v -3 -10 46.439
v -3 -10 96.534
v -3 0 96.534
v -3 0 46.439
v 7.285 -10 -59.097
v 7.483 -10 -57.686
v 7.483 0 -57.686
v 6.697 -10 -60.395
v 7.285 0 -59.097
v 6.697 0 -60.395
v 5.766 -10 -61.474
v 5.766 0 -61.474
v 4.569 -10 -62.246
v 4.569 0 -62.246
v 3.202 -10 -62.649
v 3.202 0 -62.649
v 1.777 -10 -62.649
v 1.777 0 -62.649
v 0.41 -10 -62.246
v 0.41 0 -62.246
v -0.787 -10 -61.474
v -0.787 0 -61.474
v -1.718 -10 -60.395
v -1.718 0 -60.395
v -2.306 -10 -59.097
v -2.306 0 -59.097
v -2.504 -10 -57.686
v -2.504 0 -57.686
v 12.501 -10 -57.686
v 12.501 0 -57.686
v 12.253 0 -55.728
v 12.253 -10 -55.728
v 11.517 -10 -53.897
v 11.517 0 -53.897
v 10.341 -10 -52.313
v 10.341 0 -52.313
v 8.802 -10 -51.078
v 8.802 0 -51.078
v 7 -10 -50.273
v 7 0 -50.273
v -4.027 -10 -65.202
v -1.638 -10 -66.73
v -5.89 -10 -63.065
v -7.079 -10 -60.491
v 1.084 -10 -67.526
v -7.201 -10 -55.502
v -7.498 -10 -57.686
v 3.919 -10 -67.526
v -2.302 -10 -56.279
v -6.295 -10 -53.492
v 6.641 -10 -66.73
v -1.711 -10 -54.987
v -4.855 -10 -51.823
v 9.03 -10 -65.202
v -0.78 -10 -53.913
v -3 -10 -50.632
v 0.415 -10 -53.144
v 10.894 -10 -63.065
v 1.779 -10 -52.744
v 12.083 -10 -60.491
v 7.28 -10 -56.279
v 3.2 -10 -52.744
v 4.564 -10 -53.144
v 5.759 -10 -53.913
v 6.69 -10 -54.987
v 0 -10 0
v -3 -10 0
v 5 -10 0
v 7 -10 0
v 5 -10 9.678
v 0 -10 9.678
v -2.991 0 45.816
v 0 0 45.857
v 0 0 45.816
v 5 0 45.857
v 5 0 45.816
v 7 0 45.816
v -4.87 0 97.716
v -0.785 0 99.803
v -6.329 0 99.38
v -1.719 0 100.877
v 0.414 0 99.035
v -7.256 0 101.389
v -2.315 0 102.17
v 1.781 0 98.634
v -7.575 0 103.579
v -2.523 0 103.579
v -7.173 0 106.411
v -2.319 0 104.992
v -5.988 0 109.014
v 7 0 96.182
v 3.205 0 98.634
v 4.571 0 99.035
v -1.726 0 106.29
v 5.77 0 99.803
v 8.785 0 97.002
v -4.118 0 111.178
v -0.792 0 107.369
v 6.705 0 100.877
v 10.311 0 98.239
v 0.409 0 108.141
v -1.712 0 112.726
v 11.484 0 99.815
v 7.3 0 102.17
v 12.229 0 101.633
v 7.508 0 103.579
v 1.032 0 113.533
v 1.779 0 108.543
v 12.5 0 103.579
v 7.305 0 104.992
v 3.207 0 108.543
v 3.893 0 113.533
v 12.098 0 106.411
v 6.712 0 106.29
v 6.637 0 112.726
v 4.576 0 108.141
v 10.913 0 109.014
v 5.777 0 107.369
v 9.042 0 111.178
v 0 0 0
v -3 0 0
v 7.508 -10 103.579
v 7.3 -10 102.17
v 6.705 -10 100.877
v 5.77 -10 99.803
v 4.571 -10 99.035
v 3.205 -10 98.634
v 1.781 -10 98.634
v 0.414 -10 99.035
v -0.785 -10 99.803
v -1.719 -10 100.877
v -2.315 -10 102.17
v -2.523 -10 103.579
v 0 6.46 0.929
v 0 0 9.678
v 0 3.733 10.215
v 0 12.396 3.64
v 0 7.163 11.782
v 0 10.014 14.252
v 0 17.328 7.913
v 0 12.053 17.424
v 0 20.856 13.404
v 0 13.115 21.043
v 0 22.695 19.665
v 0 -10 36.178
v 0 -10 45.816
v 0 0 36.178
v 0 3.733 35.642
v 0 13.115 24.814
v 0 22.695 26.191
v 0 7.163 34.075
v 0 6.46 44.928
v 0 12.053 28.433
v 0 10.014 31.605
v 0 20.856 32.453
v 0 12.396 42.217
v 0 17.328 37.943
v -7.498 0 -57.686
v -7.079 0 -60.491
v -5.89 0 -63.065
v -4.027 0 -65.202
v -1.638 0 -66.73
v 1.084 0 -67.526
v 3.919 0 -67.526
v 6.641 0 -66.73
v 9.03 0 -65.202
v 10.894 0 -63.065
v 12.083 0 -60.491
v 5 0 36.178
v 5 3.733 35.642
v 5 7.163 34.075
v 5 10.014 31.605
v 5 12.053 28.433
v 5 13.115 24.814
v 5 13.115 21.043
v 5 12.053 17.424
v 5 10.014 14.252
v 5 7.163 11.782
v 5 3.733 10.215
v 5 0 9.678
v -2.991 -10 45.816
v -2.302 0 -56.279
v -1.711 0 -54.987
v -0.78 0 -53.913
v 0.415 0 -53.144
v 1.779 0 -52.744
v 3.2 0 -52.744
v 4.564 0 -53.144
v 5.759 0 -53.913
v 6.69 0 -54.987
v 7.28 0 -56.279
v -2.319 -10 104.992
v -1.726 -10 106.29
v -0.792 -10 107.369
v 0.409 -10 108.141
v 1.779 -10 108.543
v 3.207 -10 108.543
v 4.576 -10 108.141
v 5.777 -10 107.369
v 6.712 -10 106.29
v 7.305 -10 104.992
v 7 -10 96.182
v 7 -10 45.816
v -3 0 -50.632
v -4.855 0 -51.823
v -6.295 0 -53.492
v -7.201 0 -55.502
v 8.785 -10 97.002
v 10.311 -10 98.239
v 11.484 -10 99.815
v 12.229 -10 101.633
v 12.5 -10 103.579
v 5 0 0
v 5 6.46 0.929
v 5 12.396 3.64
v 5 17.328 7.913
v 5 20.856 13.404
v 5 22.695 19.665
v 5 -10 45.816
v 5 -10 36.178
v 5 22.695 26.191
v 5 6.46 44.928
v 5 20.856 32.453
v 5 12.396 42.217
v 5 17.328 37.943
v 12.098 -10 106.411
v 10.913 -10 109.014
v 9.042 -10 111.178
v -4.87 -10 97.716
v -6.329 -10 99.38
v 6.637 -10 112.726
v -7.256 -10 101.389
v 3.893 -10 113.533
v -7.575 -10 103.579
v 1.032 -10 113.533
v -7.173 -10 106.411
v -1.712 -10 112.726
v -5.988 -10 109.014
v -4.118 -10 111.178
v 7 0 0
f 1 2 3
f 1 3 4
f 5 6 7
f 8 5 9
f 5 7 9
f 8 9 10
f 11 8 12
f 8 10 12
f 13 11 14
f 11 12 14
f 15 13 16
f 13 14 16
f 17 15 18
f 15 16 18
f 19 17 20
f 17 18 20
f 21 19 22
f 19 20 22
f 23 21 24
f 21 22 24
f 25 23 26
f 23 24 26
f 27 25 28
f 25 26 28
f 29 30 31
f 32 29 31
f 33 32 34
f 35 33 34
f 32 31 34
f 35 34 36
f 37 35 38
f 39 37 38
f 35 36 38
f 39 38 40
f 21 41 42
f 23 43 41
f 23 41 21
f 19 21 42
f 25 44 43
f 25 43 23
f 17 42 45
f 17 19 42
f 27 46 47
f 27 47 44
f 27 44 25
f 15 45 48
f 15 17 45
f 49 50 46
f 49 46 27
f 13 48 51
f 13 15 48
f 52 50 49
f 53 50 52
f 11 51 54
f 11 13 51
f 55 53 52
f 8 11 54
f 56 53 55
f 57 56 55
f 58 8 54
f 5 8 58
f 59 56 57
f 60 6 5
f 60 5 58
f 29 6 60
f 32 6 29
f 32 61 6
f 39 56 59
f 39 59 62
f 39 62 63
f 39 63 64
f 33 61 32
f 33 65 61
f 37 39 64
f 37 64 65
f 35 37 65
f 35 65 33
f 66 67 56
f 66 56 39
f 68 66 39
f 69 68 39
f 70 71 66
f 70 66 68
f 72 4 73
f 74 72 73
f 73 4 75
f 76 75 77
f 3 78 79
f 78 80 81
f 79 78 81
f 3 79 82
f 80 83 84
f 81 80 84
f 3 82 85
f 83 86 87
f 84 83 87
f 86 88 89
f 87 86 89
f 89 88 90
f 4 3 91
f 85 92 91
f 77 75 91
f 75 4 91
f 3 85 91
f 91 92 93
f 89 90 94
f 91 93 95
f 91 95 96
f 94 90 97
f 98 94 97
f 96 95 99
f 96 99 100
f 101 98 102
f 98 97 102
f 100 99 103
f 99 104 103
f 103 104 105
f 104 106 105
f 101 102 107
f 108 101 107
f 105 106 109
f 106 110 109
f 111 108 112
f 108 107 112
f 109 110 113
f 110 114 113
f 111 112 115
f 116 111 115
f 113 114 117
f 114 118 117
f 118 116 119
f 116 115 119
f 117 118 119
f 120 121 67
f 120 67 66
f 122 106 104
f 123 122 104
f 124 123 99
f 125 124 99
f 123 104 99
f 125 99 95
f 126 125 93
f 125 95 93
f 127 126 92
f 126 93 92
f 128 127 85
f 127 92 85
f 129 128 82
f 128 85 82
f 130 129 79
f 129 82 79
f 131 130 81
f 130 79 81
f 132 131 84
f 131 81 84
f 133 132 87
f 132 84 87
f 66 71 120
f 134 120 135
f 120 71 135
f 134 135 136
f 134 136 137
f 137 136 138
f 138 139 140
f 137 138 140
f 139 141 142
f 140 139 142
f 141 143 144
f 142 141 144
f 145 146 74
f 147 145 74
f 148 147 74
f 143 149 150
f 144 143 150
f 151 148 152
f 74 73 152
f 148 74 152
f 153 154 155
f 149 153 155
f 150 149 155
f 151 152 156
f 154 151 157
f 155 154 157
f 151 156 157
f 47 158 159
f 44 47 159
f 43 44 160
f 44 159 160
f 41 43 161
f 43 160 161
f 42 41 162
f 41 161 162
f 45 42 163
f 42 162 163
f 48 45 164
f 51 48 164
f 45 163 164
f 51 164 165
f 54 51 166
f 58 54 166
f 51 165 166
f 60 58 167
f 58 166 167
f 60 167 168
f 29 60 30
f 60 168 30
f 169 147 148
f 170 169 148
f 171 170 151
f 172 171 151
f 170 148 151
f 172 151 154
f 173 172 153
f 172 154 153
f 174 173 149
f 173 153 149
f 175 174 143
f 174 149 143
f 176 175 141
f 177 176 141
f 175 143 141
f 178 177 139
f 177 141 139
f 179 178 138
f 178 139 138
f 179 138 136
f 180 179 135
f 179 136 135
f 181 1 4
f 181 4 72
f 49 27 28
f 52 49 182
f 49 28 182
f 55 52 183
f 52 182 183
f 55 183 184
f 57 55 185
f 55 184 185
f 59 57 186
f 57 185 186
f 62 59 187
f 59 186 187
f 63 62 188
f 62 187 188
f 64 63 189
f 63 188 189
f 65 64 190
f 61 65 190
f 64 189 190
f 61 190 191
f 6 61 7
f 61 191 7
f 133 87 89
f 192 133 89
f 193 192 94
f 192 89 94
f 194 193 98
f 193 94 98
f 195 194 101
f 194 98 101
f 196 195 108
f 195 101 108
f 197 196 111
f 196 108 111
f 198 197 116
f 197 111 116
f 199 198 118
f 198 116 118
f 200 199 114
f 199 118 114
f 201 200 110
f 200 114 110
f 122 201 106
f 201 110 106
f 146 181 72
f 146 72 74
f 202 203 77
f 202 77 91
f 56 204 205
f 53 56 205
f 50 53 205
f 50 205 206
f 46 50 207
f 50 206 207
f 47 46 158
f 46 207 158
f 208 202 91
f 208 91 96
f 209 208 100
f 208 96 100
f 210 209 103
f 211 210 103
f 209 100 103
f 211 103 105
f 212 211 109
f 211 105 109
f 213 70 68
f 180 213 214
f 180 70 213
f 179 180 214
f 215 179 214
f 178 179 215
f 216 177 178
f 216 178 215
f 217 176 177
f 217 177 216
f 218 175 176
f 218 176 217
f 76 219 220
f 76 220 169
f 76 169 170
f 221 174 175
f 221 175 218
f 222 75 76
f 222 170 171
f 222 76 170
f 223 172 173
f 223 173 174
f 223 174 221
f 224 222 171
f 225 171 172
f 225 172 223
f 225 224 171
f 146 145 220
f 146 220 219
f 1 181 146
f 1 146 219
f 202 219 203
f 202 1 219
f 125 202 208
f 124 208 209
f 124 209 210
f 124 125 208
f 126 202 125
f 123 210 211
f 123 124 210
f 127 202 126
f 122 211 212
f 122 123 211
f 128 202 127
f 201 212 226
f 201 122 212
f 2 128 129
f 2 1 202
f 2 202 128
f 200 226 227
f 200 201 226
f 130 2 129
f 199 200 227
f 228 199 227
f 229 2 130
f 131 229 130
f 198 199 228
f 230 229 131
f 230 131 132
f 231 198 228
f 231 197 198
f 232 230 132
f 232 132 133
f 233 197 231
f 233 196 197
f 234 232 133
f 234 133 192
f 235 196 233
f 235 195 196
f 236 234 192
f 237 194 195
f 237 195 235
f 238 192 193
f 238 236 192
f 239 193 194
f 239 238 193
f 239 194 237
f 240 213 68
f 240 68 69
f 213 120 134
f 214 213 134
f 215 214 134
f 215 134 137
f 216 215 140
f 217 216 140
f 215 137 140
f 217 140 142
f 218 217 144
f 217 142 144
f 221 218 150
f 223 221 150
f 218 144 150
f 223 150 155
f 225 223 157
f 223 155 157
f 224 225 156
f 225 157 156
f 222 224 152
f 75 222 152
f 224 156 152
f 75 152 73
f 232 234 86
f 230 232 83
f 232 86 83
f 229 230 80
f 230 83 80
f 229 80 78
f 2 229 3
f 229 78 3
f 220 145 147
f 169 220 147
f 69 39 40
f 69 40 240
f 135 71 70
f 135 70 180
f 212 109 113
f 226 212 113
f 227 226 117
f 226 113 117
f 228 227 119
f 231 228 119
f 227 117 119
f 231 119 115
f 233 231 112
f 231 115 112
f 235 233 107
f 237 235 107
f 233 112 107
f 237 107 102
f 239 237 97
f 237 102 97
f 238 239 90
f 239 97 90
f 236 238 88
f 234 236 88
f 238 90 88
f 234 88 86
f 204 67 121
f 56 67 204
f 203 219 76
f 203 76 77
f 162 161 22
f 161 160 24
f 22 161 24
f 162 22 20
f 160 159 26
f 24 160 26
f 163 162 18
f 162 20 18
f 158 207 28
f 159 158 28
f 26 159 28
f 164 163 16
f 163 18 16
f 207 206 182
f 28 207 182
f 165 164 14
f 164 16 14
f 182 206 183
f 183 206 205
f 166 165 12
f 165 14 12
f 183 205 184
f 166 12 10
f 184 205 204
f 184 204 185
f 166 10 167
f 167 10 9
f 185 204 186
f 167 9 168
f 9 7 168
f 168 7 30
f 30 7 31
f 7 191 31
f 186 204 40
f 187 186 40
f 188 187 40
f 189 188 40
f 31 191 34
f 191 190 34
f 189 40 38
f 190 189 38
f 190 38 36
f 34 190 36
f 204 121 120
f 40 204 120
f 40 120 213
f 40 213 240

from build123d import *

# Parameters (mm, degrees)
F0_W      = 10
F0_H      = 50
F0_H_2    = 9.678417
F1_DEPTH  = 4
F2_DEPTH  = 5
F4_DEPTH  = 10
F5_DEPTH  = 5
F6_DEPTH  = 10
F7_DEPTH  = 4
F9_DEPTH  = 10
F10_DEPTH = 10
F11_DEPTH = 10
F8_W      = 2
F8_H      = 2.450932
F8_W_2    = 3
F12_DEPTH = 10


with BuildPart() as f1:
    # F0 (on Right) → F1 (new body)
    with BuildSketch(Plane.YZ):
        with BuildLine():
            ThreePointArc((0, 0), (22.928417, 22.928417), (0, 45.856834))
            Line((0, 45.856834), (0, 36.178417))
            ThreePointArc((0, 36.178417), (13.25, 22.928417), (0, 9.678417))
            Line((0, 9.678417), (0, 0))
        make_face()
        with Locations((-5, -25)):
            Rectangle(F0_W, F0_H)
        with Locations((-5, 4.839208)):
            Rectangle(F0_W, F0_H_2)
        with Locations((-5, 41.017625)):
            Rectangle(F0_W, F0_H_2)
        with Locations((-5, 70.856834)):
            Rectangle(F0_W, F0_H)
    extrude(amount=F1_DEPTH)

    # F0 (on Right) → F2 (join)
    with BuildSketch(Plane.YZ):
        with Locations((-5, 70.856834)):
            Rectangle(F0_W, F0_H)
        with Locations((-5, -25)):
            Rectangle(F0_W, F0_H)
        with BuildLine():
            ThreePointArc((0, 0), (22.928417, 22.928417), (0, 45.856834))
            Line((0, 45.856834), (0, 36.178417))
            ThreePointArc((0, 36.178417), (13.25, 22.928417), (0, 9.678417))
            Line((0, 9.678417), (0, 0))
        make_face()
    extrude(amount=F2_DEPTH)

    # F3 (on Front) → F4 (join, through all)
    with BuildSketch(Plane.XZ):
        with BuildLine():
            Line((-7.4979, -57.686251), (-2.503859, -57.686251))
            ThreePointArc((-2.503859, -57.686251), (2.489394, -52.692998), (7.482647, -57.686251))
            Line((7.482647, -57.686251), (12.501129, -57.686251))
            ThreePointArc((12.501129, -57.686251), (10.28152, -52.251641), (4.882479, -49.946863))
            Line((4.882479, -49.946863), (0, -49.946863))
            ThreePointArc((0, -49.946863), (-5.336135, -52.278896), (-7.4979, -57.686251))
        make_face()
        with BuildLine():
            Line((12.500054, 103.57853), (7.508172, 103.57853))
            ThreePointArc((7.508172, 103.57853), (2.492773, 98.583596), (-2.522626, 103.57853))
            Line((-2.522626, 103.57853), (-7.575432, 103.57853))
            ThreePointArc((-7.575432, 103.57853), (-5.361949, 98.175121), (0, 95.863014))
            Line((0, 95.863014), (5.021239, 95.826961))
            ThreePointArc((5.021239, 95.826961), (10.295439, 98.221958), (12.500054, 103.57853))
        make_face()
        with BuildLine():
            ThreePointArc((-2.522626, 103.57853), (2.492773, 108.59393), (7.508172, 103.57853))
            Line((7.508172, 103.57853), (12.500054, 103.57853))
            ThreePointArc((12.500054, 103.57853), (2.462311, 113.635186), (-7.575432, 103.57853))
            Line((-7.575432, 103.57853), (-2.522626, 103.57853))
        make_face()
    extrude(amount=F4_DEPTH)

    # F0 (on Right) → F5 (join)
    with BuildSketch(Plane.YZ):
        with Locations((-5, 4.839208)):
            Rectangle(F0_W, F0_H_2)
        with BuildLine():
            ThreePointArc((0, 0), (22.928417, 22.928417), (0, 45.856834))
            Line((0, 45.856834), (0, 36.178417))
            ThreePointArc((0, 36.178417), (13.25, 22.928417), (0, 9.678417))
            Line((0, 9.678417), (0, 0))
        make_face()
        with Locations((-5, 41.017625)):
            Rectangle(F0_W, F0_H_2)
        with Locations((-5, 70.856834)):
            Rectangle(F0_W, F0_H)
        with Locations((-5, -25)):
            Rectangle(F0_W, F0_H)
    extrude(amount=F5_DEPTH)

    # F3 (on Front) → F6 (join)
    with BuildSketch(Plane.XZ):
        with BuildLine():
            ThreePointArc((7.482647, -57.686251), (2.489394, -62.699619), (-2.503859, -57.686251))
            Line((-2.503859, -57.686251), (-7.4979, -57.686251))
            ThreePointArc((-7.4979, -57.686251), (2.501614, -67.627111), (12.501129, -57.686251))
            Line((12.501129, -57.686251), (7.482647, -57.686251))
        make_face()
    extrude(amount=F6_DEPTH)

    # F0 (on Right) → F7 (join)
    with BuildSketch(Plane.YZ):
        with BuildLine():
            ThreePointArc((0, 0), (22.928417, 22.928417), (0, 45.856834))
            Line((0, 45.856834), (0, 36.178417))
            ThreePointArc((0, 36.178417), (13.25, 22.928417), (0, 9.678417))
            Line((0, 9.678417), (0, 0))
        make_face()
        with Locations((-5, 4.839208)):
            Rectangle(F0_W, F0_H_2)
        with Locations((-5, 41.017625)):
            Rectangle(F0_W, F0_H_2)
    extrude(amount=F7_DEPTH)

    # F8 (on face) → F9 (join, through all)
    with BuildSketch(Plane.XZ.offset(10)):
        with BuildLine():
            Line((7, -2.450932), (5, -2.450932))
            Line((5, -2.450932), (5, -49.949365))
            ThreePointArc((5, -49.949365), (6.010656, -50.045316), (7, -50.272981))
            Line((7, -50.272981), (7, -49.946863))
            Line((7, -49.946863), (7, -2.450932))
        make_face()
    extrude(amount=-F9_DEPTH)

    # F8 (on face) → F10 (join, through all)
    with BuildSketch(Plane.XZ.offset(10)):
        with BuildLine():
            Line((0, -2.450932), (-3, -2.450932))
            Line((-3, -2.450932), (-3, -50.632482))
            ThreePointArc((-3, -50.632482), (-1.534725, -50.137731), (0, -49.946863))
            Line((0, -49.946863), (0, -2.450932))
        make_face()
    extrude(amount=-F10_DEPTH)

    # F8 (on face) → F11 (join, through all)
    with BuildSketch(Plane.XZ.offset(10)):
        Polygon((7, 46.067663), (7, 63.85126), (7, 95.866434), (7, 96.559308), (-3, 96.559308), (-3, 95.866434), (-3, 63.85126), (-3, 46.438996), (-2.991397, 45.816407), (0, 45.816407), (3.942358, 45.816407), (7, 45.816407), align=None)
    extrude(amount=-F11_DEPTH)

    # F8 (on face) → F12 (join, through all)
    with BuildSketch(Plane.XZ.offset(10)):
        with Locations((6, -1.225466)):
            Rectangle(F8_W, F8_H)
        with Locations((-1.5, -1.225466)):
            Rectangle(F8_W_2, F8_H)
    extrude(amount=-F12_DEPTH)


solid = f1.part
